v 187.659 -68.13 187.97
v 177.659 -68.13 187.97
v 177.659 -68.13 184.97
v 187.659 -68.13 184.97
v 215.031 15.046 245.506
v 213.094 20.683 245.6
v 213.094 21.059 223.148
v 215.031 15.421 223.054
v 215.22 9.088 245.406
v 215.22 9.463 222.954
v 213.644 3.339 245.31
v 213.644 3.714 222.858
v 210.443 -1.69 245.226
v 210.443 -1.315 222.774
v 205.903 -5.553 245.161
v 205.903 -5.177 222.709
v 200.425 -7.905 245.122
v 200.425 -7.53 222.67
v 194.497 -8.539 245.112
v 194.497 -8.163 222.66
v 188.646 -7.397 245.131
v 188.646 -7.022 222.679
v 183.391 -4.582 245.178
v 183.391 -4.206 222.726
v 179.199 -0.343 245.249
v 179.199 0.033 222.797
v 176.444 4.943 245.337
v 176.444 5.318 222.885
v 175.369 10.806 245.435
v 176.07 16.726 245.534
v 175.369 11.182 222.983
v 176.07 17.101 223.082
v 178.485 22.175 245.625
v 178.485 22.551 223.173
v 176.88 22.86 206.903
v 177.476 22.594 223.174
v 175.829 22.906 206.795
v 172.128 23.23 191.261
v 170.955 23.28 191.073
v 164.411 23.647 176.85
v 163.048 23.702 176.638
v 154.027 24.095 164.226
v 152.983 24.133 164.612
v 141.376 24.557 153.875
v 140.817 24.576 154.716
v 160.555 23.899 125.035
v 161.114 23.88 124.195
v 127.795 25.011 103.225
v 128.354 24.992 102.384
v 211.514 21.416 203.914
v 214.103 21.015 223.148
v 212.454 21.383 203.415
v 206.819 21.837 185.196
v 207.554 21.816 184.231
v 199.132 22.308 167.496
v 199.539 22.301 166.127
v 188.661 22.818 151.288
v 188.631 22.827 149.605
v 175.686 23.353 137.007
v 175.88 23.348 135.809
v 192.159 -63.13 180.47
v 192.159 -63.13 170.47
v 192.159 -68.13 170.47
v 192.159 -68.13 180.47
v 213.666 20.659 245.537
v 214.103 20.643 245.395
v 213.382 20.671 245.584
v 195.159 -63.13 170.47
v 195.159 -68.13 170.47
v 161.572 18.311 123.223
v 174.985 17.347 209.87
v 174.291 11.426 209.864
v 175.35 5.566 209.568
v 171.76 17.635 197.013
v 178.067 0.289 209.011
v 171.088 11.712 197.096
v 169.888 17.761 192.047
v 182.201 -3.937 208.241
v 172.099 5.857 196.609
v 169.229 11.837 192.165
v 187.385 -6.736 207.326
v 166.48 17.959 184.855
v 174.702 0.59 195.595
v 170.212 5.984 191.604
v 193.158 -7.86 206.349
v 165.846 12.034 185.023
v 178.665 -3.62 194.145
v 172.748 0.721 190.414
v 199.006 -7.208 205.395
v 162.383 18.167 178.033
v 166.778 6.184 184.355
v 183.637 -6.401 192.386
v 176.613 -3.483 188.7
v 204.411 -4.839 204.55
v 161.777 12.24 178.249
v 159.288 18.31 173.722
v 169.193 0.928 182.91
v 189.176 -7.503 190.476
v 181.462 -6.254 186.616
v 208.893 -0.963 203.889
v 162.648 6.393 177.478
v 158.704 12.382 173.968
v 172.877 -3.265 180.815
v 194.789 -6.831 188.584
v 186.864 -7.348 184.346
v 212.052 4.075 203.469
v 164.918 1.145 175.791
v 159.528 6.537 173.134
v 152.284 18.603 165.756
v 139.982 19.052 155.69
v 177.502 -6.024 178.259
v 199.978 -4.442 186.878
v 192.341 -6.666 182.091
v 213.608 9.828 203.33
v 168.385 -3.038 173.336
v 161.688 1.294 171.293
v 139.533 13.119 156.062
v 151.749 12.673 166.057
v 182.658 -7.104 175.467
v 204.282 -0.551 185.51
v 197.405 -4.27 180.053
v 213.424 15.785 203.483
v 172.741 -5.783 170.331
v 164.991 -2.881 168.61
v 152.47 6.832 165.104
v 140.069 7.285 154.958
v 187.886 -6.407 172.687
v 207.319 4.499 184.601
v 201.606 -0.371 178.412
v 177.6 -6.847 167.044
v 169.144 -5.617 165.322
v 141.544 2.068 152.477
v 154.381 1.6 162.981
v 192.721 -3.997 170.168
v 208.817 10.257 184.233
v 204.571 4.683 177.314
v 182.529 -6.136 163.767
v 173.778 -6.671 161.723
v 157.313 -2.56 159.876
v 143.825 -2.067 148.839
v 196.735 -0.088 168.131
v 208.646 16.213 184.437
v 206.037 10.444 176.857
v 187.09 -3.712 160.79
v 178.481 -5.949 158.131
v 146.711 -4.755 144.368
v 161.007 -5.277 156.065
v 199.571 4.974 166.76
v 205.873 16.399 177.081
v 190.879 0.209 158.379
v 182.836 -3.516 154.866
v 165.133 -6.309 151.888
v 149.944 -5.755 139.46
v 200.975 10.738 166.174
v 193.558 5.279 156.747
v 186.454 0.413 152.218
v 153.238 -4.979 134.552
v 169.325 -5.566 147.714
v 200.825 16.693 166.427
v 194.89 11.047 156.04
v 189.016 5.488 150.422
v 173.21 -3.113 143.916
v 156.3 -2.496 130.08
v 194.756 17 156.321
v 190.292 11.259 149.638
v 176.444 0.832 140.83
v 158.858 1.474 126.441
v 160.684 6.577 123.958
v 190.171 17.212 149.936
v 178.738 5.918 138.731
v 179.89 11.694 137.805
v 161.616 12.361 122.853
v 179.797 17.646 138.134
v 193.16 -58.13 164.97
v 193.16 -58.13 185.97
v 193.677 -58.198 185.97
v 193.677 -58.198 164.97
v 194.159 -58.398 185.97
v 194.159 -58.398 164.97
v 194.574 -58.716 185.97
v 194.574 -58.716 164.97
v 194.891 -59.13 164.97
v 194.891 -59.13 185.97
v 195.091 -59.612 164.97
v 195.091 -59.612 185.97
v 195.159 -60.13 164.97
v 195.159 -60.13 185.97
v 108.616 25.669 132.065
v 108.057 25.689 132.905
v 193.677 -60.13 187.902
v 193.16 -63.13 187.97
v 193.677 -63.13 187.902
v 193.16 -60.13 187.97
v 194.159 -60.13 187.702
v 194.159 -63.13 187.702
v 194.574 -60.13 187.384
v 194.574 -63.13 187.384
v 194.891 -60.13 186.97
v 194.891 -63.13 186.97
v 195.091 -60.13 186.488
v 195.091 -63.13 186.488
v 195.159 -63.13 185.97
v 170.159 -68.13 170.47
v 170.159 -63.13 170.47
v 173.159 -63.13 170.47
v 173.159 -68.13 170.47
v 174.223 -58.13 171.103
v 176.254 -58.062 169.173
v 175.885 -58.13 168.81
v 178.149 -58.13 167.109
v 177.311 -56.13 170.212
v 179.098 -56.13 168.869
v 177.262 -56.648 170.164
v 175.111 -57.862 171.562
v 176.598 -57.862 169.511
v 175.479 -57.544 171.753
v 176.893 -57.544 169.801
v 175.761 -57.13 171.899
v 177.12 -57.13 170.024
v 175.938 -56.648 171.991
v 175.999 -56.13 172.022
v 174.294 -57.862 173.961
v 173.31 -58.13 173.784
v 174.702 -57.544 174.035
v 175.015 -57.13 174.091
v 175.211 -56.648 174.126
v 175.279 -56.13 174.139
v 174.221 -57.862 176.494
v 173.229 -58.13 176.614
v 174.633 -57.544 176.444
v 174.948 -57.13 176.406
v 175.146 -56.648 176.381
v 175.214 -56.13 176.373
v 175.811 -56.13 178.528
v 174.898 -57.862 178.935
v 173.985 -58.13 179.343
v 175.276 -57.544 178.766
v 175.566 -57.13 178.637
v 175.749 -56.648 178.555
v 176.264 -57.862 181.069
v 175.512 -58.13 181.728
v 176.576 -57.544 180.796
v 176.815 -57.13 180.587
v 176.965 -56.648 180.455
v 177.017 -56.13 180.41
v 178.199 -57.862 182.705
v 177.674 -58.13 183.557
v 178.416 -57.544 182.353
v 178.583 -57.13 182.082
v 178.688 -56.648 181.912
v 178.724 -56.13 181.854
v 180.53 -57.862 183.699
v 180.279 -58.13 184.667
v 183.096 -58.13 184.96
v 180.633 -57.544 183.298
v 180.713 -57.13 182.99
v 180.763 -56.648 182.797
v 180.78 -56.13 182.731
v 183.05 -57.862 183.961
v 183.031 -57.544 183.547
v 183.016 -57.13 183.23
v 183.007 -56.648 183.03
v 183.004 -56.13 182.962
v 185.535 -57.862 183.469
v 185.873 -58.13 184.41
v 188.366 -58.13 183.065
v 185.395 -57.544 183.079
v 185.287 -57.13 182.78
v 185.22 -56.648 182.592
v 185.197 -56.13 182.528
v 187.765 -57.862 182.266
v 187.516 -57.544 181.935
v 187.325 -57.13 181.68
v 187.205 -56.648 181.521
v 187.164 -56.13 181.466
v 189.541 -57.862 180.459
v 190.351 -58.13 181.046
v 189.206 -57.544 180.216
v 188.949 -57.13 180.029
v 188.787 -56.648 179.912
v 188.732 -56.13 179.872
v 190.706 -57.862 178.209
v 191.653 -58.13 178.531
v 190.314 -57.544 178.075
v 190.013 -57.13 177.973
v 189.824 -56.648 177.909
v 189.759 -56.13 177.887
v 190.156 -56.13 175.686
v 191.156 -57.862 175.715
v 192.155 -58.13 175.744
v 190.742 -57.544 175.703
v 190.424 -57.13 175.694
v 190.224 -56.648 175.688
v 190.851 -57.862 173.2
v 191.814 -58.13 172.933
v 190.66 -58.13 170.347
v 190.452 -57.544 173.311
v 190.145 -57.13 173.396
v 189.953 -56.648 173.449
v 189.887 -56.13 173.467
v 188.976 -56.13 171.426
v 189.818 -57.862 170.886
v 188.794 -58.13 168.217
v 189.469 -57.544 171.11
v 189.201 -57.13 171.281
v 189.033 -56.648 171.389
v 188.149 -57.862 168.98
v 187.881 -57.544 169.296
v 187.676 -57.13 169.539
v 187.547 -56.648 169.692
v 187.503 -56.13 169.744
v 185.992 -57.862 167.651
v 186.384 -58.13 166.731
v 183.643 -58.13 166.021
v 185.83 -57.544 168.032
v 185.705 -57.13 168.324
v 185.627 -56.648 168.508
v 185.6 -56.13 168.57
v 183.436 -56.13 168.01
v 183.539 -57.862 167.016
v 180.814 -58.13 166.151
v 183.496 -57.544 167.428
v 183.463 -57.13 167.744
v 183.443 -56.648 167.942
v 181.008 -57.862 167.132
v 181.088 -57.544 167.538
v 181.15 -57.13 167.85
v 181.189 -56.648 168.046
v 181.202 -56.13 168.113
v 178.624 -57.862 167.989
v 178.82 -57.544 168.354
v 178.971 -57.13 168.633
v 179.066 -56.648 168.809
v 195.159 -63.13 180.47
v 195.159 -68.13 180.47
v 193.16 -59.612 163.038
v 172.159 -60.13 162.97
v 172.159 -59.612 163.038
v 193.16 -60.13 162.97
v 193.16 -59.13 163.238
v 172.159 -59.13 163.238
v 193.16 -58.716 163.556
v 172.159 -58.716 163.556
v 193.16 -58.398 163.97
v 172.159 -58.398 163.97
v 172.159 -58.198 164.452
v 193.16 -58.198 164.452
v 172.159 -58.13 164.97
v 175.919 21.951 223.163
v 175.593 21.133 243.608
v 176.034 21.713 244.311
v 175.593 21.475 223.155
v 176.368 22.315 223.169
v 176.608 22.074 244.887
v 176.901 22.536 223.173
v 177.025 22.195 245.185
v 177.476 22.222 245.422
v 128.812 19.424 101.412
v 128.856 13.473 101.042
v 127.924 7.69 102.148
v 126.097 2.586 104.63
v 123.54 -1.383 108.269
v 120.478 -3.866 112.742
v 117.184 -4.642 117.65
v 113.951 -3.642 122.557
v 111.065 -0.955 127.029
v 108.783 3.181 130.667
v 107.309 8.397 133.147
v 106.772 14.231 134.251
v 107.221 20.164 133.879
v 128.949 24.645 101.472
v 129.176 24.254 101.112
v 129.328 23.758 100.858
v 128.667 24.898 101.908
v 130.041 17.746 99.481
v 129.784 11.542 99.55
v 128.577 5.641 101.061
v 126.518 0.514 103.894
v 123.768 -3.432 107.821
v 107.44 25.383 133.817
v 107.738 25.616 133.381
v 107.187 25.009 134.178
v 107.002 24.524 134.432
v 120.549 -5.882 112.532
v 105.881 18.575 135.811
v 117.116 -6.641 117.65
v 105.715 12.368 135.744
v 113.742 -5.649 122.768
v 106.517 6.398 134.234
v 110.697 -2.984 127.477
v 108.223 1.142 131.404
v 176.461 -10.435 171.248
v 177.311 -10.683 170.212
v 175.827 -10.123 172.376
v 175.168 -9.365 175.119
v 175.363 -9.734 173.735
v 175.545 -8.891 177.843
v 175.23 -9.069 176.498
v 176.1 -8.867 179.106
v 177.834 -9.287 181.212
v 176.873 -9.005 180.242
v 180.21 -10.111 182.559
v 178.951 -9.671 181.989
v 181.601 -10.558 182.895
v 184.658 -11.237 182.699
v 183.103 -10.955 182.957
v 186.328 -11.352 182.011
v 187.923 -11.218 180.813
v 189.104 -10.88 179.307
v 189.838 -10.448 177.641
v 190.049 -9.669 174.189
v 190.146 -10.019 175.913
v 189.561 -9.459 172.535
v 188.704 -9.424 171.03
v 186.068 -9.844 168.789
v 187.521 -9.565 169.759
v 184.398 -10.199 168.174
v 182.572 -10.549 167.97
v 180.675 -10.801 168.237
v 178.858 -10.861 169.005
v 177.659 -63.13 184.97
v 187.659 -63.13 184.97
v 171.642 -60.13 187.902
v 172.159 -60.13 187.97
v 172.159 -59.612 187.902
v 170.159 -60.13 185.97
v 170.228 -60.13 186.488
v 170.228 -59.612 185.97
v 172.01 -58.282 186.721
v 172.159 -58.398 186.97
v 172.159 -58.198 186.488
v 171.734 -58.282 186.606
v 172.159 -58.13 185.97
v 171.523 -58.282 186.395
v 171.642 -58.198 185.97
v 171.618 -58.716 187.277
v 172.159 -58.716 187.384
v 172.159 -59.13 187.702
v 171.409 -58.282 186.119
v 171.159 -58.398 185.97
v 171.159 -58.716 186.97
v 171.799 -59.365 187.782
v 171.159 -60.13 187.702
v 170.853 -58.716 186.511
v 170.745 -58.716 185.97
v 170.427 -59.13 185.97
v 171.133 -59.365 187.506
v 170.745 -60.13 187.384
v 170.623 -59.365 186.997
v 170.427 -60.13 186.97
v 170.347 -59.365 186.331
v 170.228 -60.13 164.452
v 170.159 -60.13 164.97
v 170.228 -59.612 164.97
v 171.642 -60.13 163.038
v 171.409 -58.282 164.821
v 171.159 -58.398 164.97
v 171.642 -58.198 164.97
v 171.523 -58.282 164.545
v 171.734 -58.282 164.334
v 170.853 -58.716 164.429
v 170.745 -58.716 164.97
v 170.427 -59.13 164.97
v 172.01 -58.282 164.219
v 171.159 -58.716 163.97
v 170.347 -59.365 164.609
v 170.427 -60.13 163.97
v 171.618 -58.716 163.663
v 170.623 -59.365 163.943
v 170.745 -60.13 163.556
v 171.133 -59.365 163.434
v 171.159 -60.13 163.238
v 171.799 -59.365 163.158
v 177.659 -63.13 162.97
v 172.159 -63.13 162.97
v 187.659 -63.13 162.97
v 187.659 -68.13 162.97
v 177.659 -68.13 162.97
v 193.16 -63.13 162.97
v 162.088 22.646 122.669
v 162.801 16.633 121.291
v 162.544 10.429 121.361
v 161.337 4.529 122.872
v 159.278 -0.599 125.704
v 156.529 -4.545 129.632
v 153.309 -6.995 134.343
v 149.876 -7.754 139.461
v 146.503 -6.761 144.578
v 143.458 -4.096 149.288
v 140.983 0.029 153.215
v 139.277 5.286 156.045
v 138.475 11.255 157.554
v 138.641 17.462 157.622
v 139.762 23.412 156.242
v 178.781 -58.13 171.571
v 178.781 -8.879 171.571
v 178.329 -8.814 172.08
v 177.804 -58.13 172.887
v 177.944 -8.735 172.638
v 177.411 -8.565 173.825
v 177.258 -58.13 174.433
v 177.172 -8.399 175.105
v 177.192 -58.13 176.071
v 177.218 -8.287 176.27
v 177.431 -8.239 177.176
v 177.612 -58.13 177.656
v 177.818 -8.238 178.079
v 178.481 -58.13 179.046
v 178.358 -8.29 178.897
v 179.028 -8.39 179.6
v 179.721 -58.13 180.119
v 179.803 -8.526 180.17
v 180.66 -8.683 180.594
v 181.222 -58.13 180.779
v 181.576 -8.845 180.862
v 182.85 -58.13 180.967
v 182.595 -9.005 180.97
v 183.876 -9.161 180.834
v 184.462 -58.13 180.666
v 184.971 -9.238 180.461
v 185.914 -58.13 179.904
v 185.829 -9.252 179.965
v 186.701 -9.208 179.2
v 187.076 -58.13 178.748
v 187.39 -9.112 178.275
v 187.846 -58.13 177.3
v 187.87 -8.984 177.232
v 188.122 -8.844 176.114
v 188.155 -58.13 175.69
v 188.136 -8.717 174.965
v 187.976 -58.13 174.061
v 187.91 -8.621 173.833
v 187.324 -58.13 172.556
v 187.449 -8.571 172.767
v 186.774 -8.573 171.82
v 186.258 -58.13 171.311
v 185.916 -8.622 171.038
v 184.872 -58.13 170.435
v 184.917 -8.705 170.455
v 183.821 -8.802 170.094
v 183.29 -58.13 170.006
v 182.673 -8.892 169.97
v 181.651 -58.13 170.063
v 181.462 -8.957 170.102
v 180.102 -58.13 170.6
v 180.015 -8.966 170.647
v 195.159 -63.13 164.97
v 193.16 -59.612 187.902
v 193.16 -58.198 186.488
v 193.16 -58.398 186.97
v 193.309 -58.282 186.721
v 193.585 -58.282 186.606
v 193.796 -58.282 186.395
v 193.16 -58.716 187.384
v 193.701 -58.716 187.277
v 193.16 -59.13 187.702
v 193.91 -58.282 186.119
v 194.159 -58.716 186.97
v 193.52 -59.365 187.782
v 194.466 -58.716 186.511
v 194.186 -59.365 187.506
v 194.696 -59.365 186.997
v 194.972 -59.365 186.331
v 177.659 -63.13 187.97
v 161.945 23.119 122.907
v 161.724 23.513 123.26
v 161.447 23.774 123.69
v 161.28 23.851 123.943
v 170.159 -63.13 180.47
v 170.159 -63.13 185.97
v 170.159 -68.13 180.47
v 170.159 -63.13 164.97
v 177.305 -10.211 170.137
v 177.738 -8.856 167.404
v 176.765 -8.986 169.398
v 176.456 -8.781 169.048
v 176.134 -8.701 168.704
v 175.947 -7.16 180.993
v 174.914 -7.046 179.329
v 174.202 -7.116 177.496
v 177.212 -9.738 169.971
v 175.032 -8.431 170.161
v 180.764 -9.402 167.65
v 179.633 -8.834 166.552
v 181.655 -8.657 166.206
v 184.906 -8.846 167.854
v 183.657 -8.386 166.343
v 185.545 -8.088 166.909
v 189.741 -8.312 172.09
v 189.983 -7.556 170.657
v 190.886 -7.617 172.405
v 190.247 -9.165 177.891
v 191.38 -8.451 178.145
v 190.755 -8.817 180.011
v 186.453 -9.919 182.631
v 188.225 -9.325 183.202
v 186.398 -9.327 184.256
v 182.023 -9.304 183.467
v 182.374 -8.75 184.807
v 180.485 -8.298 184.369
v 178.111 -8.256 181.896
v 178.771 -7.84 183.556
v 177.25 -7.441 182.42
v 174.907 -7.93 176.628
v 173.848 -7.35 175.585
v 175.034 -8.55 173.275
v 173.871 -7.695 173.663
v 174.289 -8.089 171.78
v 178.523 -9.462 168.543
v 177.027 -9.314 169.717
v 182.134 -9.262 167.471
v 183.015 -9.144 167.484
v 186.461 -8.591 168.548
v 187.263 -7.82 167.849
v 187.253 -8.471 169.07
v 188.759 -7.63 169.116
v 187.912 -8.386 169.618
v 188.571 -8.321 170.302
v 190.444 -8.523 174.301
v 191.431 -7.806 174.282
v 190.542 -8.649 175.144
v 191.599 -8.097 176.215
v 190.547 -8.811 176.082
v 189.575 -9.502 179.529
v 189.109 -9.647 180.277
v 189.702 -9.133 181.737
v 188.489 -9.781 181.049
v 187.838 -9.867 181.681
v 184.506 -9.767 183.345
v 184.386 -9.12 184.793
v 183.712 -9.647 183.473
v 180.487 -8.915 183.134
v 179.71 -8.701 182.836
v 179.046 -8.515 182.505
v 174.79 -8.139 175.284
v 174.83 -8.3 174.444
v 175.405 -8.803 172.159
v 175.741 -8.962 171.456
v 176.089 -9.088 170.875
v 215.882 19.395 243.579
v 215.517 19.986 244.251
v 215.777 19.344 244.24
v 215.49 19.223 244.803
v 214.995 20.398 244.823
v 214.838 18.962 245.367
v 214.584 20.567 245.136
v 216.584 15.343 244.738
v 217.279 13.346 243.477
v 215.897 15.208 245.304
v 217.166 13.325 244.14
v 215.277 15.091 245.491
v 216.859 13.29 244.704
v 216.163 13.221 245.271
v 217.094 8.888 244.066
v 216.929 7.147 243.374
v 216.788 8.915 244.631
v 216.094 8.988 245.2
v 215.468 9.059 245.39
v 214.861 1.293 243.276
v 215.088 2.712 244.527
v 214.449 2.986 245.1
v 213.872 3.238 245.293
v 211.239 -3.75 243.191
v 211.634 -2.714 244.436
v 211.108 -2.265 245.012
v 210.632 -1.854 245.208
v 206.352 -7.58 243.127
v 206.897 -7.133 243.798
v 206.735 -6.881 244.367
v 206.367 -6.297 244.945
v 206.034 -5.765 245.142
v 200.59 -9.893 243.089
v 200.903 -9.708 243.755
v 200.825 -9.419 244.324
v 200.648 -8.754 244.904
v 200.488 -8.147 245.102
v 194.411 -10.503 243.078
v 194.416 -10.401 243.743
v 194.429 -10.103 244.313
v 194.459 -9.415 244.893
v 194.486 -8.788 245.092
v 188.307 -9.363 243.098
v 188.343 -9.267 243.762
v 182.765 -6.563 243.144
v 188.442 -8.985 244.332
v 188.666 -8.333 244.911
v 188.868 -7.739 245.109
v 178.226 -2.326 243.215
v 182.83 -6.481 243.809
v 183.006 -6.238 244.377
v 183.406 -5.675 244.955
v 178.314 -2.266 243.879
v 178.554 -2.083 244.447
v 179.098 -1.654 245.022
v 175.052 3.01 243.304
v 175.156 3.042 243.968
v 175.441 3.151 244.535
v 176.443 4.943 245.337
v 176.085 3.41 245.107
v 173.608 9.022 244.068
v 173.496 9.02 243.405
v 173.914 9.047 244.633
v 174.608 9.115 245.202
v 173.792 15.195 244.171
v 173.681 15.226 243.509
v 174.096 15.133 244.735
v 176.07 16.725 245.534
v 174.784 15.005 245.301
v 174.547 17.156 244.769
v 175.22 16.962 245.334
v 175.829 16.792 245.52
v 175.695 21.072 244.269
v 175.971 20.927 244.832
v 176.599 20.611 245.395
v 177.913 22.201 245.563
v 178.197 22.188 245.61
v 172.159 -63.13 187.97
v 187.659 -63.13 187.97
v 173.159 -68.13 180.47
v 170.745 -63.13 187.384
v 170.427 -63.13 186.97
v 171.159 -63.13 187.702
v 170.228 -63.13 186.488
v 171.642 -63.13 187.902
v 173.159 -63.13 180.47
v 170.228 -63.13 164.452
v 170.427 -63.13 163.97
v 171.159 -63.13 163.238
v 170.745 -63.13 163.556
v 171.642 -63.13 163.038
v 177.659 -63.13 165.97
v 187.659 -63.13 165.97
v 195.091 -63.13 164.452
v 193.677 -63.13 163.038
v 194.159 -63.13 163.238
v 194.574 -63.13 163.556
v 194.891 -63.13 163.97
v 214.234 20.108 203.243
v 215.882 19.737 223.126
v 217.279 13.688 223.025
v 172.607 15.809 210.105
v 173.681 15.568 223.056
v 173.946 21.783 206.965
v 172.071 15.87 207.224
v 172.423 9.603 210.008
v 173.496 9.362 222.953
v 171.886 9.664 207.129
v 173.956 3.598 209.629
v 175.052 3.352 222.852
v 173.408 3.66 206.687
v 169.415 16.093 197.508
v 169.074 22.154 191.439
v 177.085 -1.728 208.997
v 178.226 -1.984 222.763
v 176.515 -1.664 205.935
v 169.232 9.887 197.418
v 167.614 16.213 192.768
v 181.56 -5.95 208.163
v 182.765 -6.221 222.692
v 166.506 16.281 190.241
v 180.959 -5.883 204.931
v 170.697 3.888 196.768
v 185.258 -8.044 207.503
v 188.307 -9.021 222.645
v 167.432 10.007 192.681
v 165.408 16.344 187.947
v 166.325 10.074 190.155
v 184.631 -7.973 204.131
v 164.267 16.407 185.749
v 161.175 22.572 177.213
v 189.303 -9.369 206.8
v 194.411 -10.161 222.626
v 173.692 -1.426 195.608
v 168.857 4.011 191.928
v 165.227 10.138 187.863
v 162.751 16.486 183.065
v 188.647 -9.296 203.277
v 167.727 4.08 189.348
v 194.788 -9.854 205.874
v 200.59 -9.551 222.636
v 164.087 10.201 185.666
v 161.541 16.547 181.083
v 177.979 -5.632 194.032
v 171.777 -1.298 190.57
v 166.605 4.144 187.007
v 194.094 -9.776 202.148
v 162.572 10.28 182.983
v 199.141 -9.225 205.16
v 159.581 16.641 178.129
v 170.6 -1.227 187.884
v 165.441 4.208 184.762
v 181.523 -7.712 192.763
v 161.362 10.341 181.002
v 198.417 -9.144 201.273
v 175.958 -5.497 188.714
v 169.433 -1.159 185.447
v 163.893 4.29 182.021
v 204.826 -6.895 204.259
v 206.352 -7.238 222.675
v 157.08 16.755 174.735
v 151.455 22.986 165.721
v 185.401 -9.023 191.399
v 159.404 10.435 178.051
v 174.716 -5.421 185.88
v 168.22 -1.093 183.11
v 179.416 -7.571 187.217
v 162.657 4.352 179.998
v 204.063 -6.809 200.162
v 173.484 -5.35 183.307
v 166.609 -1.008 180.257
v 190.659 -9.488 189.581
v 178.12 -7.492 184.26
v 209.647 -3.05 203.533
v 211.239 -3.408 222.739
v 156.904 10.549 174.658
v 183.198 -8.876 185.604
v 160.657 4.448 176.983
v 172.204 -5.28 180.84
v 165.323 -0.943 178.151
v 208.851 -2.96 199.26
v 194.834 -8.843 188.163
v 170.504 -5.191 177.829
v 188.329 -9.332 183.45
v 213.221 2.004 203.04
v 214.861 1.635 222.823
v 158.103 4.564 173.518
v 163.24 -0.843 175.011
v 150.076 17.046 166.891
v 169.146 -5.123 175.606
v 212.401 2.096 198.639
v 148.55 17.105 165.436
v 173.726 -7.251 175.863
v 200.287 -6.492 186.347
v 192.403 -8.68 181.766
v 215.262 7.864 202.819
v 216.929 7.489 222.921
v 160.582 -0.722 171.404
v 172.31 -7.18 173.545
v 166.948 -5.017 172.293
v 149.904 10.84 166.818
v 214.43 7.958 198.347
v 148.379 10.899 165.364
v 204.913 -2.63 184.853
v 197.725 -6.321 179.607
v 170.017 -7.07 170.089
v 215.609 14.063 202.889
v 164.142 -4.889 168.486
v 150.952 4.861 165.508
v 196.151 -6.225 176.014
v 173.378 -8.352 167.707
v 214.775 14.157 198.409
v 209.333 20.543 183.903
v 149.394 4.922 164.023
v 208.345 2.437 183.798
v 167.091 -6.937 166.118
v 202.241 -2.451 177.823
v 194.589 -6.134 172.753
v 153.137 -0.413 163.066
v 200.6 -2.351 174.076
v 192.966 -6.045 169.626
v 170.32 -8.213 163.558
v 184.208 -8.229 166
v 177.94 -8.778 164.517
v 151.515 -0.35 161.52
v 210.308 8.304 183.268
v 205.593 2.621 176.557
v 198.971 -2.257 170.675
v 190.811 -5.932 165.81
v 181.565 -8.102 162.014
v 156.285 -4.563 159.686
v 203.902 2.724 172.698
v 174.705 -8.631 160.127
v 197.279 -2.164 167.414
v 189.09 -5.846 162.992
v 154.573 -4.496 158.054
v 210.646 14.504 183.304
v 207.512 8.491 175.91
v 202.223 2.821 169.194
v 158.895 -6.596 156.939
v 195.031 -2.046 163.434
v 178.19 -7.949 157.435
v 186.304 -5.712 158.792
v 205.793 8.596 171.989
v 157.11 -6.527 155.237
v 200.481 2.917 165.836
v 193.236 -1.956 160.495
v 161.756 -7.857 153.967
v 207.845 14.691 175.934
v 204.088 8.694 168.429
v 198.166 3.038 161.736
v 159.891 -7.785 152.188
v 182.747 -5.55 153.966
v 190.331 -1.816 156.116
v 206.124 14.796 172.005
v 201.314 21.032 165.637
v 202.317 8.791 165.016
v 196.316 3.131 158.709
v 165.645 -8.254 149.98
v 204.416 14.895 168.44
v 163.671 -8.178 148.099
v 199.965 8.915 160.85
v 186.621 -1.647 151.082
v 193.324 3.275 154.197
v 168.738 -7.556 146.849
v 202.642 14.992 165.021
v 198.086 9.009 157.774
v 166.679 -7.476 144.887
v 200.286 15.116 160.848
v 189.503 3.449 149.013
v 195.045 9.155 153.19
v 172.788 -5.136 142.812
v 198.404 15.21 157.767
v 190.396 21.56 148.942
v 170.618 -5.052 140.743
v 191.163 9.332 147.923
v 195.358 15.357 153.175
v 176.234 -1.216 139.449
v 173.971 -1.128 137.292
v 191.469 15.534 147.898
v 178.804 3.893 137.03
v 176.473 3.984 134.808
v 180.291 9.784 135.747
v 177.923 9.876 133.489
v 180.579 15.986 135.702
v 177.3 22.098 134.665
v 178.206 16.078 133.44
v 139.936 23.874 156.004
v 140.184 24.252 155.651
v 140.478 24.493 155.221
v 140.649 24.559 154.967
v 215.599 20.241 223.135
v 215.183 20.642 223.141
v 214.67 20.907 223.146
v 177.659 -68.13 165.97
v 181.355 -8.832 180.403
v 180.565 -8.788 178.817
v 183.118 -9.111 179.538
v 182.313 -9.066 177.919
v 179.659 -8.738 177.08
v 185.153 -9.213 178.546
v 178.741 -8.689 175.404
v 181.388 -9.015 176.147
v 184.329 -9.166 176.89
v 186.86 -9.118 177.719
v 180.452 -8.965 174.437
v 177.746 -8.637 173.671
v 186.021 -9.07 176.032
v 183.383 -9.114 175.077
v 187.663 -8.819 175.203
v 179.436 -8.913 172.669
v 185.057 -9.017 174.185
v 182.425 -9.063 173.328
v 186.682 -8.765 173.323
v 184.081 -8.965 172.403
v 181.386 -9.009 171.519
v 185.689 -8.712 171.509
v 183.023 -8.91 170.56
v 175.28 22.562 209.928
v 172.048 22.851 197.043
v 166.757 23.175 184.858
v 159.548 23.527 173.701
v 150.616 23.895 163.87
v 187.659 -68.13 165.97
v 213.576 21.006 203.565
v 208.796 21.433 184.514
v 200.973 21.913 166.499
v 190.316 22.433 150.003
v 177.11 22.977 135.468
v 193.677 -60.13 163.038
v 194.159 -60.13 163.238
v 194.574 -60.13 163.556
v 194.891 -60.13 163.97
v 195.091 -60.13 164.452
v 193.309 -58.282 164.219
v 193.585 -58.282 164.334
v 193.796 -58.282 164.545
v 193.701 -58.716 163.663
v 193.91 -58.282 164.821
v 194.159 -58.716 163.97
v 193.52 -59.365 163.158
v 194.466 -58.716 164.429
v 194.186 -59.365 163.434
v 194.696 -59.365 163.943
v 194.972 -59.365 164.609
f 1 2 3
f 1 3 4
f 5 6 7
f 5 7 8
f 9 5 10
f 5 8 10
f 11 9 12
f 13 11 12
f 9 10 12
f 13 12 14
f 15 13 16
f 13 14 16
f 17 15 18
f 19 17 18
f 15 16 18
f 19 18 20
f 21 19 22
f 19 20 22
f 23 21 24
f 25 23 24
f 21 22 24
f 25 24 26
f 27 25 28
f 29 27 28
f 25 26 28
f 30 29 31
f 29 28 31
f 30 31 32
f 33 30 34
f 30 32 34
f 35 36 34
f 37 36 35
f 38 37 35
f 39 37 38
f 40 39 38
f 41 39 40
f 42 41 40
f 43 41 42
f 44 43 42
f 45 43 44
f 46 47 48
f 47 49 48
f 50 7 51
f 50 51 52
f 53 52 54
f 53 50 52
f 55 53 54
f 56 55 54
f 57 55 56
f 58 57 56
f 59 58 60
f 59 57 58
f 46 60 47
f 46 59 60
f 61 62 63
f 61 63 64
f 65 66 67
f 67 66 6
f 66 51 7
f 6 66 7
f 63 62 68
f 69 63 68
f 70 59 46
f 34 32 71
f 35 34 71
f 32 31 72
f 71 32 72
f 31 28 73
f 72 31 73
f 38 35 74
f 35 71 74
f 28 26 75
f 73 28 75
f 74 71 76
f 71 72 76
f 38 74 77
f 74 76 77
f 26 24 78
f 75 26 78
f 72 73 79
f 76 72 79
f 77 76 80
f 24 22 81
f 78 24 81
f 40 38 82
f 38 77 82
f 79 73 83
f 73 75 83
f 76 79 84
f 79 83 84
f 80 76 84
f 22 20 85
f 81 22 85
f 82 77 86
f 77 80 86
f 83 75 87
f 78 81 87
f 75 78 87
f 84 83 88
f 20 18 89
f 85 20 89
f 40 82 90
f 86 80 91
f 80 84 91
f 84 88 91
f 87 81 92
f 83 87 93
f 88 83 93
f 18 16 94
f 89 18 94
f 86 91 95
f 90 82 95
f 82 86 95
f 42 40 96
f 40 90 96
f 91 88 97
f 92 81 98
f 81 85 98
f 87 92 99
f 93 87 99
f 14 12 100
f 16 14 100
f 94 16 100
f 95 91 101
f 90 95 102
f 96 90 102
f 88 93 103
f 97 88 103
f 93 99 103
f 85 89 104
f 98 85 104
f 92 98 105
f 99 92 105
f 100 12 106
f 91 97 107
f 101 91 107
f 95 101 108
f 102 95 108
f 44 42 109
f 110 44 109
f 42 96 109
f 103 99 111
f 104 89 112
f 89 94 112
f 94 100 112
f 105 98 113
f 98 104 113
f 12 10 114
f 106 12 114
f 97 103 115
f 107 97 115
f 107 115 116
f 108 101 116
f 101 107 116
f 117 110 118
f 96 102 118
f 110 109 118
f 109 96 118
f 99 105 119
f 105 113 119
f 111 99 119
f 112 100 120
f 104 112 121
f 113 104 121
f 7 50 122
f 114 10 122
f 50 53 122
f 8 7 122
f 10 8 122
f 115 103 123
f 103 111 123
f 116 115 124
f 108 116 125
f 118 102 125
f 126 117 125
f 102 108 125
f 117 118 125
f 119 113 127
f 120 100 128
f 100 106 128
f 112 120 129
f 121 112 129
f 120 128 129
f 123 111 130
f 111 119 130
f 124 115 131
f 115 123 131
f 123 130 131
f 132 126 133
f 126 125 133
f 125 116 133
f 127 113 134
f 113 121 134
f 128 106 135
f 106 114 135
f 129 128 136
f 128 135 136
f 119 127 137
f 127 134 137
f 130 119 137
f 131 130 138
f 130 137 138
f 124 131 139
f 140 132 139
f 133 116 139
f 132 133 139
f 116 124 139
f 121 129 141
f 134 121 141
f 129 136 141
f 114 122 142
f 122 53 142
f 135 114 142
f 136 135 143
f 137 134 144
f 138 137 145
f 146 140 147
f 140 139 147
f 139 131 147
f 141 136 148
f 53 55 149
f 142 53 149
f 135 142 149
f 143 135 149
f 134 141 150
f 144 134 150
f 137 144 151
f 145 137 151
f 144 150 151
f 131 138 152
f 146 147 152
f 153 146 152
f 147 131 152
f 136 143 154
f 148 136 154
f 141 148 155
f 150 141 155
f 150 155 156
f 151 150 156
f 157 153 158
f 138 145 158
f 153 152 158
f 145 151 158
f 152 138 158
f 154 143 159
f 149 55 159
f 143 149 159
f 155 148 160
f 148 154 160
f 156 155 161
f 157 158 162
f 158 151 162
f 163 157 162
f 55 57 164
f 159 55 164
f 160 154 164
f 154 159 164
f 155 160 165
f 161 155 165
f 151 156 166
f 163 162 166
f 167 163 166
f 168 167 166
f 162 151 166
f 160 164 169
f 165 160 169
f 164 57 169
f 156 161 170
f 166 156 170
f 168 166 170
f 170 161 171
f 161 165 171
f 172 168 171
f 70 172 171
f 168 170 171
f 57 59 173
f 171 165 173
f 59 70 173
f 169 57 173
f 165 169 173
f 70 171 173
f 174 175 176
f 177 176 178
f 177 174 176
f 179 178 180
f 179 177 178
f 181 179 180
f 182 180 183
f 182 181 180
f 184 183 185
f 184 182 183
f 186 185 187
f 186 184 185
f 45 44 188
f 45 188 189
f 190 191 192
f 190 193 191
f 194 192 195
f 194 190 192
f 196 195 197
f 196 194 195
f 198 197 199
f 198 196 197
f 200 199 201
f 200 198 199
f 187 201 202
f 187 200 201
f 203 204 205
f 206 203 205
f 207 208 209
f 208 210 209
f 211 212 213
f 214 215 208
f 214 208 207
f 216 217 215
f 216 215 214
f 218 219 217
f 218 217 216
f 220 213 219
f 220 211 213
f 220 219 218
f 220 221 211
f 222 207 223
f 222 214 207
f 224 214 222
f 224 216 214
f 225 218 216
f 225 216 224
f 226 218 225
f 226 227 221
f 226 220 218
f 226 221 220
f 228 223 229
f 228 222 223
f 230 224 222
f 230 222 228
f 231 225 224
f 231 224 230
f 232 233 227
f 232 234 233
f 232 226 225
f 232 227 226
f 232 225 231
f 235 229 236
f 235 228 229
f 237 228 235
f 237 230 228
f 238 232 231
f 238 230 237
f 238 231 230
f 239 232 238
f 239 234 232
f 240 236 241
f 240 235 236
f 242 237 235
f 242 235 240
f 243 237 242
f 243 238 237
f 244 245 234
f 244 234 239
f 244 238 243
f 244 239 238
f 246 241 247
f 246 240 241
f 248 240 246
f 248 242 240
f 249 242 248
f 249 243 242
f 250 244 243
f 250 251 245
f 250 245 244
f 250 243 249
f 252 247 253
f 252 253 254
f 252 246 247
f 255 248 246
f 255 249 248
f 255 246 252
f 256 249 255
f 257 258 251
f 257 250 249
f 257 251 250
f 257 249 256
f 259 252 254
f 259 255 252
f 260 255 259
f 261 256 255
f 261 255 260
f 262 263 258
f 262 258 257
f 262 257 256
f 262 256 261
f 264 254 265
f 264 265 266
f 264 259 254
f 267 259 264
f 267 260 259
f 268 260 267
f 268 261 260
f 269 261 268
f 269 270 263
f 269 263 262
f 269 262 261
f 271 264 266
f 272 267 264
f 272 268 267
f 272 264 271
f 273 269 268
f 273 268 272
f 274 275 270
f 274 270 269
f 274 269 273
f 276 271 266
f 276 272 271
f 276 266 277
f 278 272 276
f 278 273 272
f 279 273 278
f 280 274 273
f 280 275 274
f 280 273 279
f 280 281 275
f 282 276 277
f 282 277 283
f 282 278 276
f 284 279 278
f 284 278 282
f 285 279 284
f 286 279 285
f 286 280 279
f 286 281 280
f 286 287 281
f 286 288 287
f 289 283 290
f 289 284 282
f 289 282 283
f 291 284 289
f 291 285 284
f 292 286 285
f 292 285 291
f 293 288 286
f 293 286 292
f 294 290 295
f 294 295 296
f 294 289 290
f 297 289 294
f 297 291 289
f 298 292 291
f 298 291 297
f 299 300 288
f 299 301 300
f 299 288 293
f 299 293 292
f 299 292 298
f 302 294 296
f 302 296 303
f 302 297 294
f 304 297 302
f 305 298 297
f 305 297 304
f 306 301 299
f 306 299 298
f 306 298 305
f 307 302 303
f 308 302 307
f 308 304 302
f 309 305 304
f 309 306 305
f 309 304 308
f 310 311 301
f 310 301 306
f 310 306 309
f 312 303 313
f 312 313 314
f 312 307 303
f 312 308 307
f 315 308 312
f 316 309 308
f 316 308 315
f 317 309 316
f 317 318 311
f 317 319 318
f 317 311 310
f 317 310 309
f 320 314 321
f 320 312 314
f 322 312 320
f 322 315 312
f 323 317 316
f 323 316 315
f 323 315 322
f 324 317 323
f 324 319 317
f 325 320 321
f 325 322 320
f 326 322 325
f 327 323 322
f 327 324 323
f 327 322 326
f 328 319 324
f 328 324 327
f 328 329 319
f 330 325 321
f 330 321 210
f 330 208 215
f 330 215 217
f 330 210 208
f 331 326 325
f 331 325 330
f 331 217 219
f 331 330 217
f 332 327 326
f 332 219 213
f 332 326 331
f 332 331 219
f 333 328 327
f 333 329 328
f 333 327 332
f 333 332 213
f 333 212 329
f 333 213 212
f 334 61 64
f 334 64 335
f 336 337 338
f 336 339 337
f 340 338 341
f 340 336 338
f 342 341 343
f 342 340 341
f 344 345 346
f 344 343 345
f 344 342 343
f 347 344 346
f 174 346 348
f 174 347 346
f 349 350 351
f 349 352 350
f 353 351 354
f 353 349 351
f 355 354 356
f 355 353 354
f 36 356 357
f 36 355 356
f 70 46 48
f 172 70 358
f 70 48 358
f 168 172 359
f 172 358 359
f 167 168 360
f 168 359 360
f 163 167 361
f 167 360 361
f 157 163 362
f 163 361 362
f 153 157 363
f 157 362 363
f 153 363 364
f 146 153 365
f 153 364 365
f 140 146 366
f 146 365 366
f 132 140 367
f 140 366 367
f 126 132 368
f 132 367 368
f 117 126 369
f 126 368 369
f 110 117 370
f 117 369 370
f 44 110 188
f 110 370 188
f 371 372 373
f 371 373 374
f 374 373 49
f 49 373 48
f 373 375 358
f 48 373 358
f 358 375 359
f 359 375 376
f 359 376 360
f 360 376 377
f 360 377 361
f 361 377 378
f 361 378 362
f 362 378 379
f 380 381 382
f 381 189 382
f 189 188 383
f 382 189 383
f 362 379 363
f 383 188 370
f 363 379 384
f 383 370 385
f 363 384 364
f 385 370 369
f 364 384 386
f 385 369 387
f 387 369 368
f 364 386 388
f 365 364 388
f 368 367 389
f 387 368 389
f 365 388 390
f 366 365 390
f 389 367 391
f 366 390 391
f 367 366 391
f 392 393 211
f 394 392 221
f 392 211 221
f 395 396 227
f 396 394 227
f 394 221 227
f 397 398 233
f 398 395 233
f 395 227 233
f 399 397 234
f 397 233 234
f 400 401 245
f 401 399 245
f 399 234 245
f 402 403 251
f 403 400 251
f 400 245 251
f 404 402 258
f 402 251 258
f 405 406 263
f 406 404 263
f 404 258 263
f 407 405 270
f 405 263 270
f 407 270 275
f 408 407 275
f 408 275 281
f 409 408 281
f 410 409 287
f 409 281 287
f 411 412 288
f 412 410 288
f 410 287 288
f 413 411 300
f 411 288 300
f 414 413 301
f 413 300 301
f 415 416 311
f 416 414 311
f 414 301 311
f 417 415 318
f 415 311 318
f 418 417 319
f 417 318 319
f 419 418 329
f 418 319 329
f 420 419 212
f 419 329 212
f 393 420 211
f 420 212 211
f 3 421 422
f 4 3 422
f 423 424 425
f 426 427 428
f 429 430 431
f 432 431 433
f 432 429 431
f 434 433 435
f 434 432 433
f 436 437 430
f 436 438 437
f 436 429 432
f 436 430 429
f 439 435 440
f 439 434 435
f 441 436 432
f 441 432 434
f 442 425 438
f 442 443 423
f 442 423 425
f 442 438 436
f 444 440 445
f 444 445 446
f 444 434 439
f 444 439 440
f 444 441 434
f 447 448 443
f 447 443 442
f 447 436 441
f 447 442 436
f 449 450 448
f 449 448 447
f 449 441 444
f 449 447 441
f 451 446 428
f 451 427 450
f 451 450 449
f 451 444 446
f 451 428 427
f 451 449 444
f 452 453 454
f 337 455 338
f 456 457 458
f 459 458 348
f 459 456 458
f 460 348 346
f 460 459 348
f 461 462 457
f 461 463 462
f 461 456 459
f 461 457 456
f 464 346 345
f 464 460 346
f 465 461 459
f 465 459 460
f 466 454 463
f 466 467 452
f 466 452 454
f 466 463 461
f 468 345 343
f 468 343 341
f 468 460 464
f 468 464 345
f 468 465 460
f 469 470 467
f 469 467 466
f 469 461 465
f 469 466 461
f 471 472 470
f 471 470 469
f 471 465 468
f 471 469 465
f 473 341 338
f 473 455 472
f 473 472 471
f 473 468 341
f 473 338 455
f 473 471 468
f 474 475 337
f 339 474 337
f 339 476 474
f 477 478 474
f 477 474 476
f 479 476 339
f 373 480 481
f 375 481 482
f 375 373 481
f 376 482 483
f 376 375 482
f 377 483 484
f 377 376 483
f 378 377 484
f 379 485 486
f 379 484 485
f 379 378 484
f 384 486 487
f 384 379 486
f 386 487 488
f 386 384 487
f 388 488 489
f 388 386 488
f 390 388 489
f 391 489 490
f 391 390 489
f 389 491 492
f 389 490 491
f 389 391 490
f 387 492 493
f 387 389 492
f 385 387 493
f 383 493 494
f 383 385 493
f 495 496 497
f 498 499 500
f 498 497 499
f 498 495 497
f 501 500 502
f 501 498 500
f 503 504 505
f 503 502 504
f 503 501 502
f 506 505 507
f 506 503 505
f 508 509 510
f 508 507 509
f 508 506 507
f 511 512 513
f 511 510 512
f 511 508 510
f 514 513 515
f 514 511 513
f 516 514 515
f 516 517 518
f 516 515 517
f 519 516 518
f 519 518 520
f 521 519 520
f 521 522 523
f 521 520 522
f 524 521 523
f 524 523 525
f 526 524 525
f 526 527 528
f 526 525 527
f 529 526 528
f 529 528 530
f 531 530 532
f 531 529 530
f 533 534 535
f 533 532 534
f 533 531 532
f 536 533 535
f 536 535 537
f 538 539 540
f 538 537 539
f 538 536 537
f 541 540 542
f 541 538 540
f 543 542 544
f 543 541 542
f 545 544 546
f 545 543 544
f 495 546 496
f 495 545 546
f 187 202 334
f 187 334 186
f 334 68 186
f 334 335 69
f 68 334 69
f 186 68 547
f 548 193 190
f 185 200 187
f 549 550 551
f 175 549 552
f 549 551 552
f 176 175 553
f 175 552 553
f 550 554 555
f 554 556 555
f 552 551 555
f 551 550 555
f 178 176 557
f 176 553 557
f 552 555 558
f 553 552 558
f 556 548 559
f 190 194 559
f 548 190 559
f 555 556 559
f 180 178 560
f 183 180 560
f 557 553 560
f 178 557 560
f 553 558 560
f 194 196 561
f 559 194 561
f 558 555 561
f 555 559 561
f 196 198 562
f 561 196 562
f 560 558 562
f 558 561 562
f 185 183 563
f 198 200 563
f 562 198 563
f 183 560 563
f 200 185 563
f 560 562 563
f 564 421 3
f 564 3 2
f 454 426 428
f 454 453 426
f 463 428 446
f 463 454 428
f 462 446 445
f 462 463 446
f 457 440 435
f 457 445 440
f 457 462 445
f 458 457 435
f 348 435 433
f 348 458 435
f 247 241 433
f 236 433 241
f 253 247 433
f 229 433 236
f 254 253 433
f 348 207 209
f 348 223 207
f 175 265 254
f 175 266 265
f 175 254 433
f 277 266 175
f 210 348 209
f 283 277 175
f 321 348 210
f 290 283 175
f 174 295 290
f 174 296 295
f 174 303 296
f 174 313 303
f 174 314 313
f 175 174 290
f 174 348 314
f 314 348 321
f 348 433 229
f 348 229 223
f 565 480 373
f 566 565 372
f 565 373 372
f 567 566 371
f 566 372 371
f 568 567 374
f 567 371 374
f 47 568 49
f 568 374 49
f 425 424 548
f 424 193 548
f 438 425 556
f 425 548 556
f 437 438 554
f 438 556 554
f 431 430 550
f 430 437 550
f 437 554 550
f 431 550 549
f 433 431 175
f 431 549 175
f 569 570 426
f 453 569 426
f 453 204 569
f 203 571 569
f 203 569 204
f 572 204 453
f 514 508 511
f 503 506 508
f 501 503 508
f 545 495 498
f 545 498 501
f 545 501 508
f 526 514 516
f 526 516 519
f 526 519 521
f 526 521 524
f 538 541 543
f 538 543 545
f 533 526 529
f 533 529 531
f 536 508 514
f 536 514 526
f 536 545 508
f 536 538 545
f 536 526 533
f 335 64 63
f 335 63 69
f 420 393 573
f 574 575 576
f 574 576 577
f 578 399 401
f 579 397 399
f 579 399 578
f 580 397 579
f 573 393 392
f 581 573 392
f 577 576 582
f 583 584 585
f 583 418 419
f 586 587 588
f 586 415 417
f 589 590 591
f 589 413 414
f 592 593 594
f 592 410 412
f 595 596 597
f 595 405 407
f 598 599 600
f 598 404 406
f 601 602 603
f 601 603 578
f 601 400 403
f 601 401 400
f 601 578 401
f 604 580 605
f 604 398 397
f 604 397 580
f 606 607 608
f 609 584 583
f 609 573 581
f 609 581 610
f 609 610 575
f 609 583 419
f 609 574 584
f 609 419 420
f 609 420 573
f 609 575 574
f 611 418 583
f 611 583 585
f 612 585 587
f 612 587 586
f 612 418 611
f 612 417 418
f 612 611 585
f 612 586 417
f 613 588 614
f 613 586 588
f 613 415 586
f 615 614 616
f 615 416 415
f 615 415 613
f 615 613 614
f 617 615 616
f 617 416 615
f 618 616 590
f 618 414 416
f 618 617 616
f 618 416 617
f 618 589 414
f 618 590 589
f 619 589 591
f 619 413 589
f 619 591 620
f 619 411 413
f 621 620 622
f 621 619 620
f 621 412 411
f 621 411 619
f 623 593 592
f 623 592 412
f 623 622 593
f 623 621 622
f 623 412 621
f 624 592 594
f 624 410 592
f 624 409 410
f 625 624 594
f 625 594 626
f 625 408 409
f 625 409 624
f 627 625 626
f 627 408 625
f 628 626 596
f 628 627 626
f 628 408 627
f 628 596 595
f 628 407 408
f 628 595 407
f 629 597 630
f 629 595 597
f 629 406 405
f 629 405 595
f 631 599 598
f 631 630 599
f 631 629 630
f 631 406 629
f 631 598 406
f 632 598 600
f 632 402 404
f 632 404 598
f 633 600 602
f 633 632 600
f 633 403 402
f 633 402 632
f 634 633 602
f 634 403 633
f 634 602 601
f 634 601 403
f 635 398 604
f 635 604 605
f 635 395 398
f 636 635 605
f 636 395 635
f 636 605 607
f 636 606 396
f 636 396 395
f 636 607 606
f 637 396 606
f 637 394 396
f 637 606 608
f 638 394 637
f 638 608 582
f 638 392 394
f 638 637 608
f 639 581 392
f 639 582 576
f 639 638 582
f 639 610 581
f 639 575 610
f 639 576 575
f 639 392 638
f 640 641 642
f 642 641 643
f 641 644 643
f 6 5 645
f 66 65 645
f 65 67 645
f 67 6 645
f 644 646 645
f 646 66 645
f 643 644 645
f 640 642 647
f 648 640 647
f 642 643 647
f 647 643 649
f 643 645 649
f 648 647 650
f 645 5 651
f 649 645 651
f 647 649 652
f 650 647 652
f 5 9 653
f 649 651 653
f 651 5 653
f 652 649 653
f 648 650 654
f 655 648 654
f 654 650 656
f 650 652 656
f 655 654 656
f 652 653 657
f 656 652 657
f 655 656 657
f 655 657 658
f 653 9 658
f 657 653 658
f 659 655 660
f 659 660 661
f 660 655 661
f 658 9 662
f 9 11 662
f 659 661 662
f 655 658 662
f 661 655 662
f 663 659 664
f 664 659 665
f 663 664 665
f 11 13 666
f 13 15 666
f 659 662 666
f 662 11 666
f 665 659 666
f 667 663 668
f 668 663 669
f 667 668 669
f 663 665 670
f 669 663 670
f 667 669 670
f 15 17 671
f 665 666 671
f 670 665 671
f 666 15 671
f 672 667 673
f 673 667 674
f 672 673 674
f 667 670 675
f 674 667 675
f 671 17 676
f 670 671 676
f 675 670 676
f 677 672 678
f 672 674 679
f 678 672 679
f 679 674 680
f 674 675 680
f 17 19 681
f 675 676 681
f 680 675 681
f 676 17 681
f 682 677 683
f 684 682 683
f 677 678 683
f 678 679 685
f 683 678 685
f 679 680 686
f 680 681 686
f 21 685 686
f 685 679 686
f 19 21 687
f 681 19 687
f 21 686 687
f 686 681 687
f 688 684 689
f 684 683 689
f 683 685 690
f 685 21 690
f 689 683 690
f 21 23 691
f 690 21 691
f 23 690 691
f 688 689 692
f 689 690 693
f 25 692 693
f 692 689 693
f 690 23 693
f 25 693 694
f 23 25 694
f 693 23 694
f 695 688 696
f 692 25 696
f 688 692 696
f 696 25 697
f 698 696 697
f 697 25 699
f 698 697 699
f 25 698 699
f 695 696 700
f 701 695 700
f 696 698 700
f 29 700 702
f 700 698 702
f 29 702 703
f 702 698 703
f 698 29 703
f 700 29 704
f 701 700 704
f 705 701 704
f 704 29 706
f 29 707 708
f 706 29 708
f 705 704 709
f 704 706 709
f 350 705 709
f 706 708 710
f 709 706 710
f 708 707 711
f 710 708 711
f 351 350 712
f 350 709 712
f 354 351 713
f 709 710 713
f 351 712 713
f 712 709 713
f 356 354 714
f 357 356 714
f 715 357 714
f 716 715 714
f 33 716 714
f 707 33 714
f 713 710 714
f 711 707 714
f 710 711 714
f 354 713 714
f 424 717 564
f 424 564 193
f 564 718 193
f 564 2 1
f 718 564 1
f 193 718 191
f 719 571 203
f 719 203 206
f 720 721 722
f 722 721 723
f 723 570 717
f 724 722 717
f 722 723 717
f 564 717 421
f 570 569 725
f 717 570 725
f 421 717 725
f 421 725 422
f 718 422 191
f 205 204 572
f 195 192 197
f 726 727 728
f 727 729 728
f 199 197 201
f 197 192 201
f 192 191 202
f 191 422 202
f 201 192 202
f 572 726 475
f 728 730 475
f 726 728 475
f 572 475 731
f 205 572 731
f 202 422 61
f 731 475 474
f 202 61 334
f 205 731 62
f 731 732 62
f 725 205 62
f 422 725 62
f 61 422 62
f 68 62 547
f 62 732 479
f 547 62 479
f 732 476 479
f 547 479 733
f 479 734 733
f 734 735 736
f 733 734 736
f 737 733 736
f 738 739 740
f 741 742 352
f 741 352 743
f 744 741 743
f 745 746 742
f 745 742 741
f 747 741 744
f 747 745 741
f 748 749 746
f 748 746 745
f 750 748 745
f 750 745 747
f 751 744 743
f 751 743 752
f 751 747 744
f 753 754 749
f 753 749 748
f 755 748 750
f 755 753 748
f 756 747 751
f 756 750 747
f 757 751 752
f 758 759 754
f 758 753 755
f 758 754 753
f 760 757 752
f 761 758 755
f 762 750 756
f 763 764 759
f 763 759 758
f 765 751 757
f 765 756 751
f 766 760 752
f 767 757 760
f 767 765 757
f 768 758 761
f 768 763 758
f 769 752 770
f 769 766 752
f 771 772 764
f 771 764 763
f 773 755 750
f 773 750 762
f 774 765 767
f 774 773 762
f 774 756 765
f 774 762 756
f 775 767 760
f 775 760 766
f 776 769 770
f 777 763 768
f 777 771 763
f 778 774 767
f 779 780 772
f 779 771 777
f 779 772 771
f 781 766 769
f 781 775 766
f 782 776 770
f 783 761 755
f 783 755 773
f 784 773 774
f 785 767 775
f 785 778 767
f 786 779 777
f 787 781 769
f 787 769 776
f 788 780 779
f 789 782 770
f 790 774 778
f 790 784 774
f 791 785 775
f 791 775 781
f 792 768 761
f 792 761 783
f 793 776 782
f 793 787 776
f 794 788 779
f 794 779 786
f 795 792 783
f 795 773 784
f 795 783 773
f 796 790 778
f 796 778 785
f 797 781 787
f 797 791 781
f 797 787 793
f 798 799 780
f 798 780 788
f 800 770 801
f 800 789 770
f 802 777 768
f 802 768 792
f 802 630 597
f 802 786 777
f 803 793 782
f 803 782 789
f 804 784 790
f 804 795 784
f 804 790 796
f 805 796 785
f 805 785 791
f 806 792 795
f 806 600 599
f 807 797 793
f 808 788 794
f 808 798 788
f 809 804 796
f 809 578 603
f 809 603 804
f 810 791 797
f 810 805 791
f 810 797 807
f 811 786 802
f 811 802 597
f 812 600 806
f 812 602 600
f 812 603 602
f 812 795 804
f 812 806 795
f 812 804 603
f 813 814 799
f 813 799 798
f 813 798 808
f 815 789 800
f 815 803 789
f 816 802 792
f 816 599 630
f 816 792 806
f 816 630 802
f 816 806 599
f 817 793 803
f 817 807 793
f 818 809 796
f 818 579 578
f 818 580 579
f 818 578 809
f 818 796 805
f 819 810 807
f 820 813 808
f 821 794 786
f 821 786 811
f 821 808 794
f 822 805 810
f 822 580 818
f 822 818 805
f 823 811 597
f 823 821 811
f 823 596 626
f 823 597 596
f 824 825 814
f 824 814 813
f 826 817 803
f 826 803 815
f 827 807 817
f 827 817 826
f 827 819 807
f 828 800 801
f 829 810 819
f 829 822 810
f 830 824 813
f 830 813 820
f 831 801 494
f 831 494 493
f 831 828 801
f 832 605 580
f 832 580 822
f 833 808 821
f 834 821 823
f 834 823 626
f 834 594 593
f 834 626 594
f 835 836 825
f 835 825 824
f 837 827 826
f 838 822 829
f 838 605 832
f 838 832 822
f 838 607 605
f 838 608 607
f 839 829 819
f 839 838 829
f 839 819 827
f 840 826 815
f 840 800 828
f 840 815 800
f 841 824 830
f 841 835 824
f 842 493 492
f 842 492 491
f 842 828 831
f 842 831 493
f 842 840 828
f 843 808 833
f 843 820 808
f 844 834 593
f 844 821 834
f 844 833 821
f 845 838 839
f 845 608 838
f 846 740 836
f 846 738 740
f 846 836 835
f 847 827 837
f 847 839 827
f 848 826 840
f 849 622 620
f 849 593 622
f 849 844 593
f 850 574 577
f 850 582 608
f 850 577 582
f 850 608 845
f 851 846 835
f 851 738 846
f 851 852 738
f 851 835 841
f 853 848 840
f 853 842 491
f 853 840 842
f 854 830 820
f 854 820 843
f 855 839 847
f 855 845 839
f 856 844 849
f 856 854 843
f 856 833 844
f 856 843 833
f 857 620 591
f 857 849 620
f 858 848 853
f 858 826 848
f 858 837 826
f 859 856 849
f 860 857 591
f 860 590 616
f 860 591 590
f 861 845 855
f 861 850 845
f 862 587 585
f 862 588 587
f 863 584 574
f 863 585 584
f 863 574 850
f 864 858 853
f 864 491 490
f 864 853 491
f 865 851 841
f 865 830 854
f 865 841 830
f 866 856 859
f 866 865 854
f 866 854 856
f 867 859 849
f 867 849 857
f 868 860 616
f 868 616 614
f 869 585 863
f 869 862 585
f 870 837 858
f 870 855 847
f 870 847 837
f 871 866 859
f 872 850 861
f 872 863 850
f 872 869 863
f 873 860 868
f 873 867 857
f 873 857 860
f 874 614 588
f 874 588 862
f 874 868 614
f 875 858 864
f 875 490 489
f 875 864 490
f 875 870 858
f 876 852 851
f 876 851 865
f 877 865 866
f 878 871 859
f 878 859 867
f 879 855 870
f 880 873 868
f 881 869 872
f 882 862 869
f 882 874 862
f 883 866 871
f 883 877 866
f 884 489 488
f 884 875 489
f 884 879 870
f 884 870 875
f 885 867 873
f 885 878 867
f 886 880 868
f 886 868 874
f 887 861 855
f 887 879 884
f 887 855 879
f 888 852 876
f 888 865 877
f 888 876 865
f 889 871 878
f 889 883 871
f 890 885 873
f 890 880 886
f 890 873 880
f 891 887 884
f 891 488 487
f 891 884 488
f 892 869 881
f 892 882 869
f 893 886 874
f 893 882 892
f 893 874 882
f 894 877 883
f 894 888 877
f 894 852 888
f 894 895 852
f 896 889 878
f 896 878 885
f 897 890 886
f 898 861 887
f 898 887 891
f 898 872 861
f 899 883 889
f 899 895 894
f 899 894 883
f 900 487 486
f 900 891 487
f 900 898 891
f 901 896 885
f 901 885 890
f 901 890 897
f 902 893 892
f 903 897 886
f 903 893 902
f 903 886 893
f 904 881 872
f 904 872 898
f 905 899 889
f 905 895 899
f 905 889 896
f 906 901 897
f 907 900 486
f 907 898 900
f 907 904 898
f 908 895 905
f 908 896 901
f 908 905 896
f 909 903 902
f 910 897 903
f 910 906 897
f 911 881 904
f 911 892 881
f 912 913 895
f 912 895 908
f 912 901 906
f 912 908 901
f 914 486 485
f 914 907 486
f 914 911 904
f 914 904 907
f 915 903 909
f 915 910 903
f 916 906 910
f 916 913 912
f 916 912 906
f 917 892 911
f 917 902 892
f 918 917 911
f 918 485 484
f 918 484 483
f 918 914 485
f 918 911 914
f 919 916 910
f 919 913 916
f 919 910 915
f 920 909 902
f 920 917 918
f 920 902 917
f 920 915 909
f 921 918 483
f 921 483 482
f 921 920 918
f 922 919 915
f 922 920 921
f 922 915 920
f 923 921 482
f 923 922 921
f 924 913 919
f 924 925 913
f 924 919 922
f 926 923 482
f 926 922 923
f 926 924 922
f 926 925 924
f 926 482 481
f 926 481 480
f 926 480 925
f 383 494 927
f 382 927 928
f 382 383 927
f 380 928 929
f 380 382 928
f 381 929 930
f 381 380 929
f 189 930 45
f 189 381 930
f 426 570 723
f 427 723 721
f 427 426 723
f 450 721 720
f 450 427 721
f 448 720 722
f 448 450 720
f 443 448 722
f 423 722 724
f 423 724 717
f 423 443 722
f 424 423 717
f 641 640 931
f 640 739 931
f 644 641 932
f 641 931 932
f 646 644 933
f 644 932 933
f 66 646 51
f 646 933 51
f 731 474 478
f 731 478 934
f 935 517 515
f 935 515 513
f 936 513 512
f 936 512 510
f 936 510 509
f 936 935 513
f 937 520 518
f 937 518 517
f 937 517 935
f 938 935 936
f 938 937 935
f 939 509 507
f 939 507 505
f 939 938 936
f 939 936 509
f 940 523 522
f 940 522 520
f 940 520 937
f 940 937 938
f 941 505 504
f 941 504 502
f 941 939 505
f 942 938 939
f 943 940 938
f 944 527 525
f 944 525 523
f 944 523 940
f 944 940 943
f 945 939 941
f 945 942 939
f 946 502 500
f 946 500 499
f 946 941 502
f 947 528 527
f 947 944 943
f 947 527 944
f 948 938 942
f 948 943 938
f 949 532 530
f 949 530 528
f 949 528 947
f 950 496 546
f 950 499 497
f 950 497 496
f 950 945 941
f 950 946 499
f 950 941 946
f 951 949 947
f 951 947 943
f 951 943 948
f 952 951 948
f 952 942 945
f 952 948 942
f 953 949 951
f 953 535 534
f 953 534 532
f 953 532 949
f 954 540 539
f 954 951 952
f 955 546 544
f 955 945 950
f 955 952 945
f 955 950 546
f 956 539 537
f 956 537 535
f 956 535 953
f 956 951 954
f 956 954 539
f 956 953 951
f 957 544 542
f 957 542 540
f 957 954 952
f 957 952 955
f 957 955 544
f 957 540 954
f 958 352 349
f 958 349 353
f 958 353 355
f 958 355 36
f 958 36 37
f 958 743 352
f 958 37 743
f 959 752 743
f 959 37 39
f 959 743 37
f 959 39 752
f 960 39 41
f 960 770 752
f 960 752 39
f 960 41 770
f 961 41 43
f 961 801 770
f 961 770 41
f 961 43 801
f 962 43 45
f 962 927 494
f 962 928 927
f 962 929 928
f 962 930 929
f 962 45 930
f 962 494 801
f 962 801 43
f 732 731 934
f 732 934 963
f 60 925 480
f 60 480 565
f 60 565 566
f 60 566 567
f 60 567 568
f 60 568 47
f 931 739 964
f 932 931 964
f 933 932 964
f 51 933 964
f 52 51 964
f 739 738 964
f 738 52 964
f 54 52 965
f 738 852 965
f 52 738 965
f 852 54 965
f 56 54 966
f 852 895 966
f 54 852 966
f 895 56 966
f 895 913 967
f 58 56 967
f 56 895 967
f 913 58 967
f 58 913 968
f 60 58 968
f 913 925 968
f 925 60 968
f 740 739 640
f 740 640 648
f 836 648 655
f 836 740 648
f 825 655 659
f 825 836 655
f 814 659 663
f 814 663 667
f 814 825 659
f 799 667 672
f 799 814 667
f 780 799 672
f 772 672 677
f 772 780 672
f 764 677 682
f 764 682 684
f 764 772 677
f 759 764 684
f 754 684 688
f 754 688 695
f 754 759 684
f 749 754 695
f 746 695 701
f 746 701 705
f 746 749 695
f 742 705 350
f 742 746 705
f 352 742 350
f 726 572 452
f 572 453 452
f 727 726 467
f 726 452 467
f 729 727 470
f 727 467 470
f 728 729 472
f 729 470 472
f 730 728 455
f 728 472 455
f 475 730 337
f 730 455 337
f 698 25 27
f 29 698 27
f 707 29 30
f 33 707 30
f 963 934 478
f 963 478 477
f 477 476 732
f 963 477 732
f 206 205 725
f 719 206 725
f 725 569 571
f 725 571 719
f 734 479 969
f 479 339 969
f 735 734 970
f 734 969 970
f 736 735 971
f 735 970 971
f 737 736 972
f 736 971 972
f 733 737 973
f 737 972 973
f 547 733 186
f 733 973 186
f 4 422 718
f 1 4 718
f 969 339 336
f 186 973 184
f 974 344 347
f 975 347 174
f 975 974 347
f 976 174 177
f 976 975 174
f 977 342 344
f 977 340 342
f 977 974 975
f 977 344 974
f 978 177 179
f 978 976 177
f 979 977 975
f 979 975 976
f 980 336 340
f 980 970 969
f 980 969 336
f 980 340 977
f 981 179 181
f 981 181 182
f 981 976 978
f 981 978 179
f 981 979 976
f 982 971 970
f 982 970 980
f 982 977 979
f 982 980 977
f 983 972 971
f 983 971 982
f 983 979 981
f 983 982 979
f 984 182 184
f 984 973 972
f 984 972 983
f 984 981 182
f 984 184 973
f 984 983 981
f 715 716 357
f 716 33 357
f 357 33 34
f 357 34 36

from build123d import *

# Parameters (mm, degrees)
SKETCH8_W                      = 25
SKETCH8_H                      = 25
BOSS_EXTRUDE1_DEPTH            = 5
BOSS_EXTRUDE2_REACH            = 340.536
BOSS_EXTRUDE2_END_MAJOR_RADIUS = 100.405635927
BOSS_EXTRUDE2_END_MINOR_RADIUS = 22
SKETCH9_R                      = 7.5
SKETCH9_R_2                    = 5.5
SKETCH10_W                     = 3
SKETCH10_H                     = 10
SKETCH10_W_2                   = 10
SKETCH10_H_2                   = 3
BOSS_EXTRUDE3_DEPTH            = 5
FILLET1_R                      = 2


with BuildPart() as part:
    # Sweep1: sweep along a path in Sketch5
    with BuildLine(Plane(origin=(0, 0, 0), x_dir=(0.9997397545029943, -0.022809596622636426, -0.00038153401579630816), z_dir=(0.022812787341589733, 0.9995999255318432, 0.016720215621847893))) as sweep1_path:
        Line((194.547507167, -245.220027859), (194.547507167, -222.76492725))
        ThreePointArc((194.547507167, -222.76492725), (182.70523744, -175.56095927), (149.983215305, -139.53703371))
        Line((149.983215305, -139.53703371), (117.214576165, -117.710784863))
    # Sketch7 → Sweep1 (sweep)
    with BuildSketch(Plane(origin=(117.1840716, -4.64227924, 117.649599852), x_dir=(0.5536361283474212, -0.018999100028837552, -0.8325419338307064), z_dir=(0.8320623385601692, -0.028255329561967652, 0.5539620033008825))):
        with BuildLine():
            Line((-17.320508076, 30), (-19.595917942, 30))
            ThreePointArc((-19.595917942, 30), (0, -2), (19.595917942, 30))
            Line((19.595917942, 30), (17.320508076, 30))
            ThreePointArc((17.320508076, 30), (0, 0), (-17.320508076, 30))
        make_face()
    sweep(path=sweep1_path.line)



with BuildPart() as body_2:
    # Sketch8 → Boss-Extrude1 (new body)
    with BuildSketch(Plane(origin=(0, -63.13, 0), x_dir=(1, 0, 0), z_dir=(0, 1, 0))):
        with Locations((182.659431616, -175.469950055)):
            Rectangle(SKETCH8_W, SKETCH8_H)
    extrude(amount=BOSS_EXTRUDE1_DEPTH)


with BuildPart() as part_1:
    add(part.part)

    add(body_2.part)  # Boss-Extrude2 merges body 2
    # Boss-Extrude2: up to this torus (the profile starts outside it)
    boss_extrude2_end = Plane(origin=(94.9790635, 14.105648521, 223.032032588), z_dir=(-0.022812787341589733, -0.9995999255318432, -0.016720215621847893)) * Torus(BOSS_EXTRUDE2_END_MAJOR_RADIUS, BOSS_EXTRUDE2_END_MINOR_RADIUS, mode=Mode.PRIVATE)
    # Sketch9 → Boss-Extrude2 (add, up to the surface)
    with BuildSketch(Plane(origin=(0, -58.13, 0), x_dir=(1, 0, 0), z_dir=(0, 1, 0)), mode=Mode.PRIVATE) as boss_extrude2_sk1:
        with Locations(Location((182.659431616, -175.469950055, 0), (0, 0, 135.488790449))):
            Circle(SKETCH9_R)
        with Locations(Location((182.659431616, -175.469950055, 0), (0, 0, 134.847331682))):
            Circle(SKETCH9_R_2, mode=Mode.SUBTRACT)
    boss_extrude2_tool1 = extrude(boss_extrude2_sk1.sketch, amount=BOSS_EXTRUDE2_REACH, mode=Mode.PRIVATE) - boss_extrude2_end
    add(boss_extrude2_tool1.solids().sort_by_distance((187.856507, -58.13, 180.579101))[0])

    # Sketch10 → Boss-Extrude3 (add)
    with BuildSketch(Plane.XZ.offset(63.13)):
        with Locations((193.659431616, 175.469950055)):
            Rectangle(SKETCH10_W, SKETCH10_H)
        with Locations((182.659431616, 164.469950055)):
            Rectangle(SKETCH10_W_2, SKETCH10_H_2)
        with Locations((171.659431616, 175.469950055)):
            Rectangle(SKETCH10_W, SKETCH10_H)
        with Locations((182.659431616, 186.469950055)):
            Rectangle(SKETCH10_W_2, SKETCH10_H_2)
    extrude(amount=BOSS_EXTRUDE3_DEPTH)

    # Fillet1
    fillet1_edges = [part_1.edges().sort_by_distance(p)[0] for p in [
        (170.159431616, -60.63, 187.969950055),
        (170.159431616, -60.63, 162.969950055),
        (195.159431616, -60.63, 162.969950055),
        (195.159431616, -60.63, 187.969950055),
        (187.938592199, -9.225851682, 180.797281789),
        (188.007781419, -58.13, 180.727816009),
        (182.659431616, -58.13, 187.969950055),
        (170.159431616, -58.13, 175.469950055),
        (182.659431616, -58.13, 162.969950055),
        (195.159431616, -58.13, 175.469950055),
        (123.73657487, 25.156393567, 144.864412221),
        (166.619990229, 23.507355906, 184.94091022),
        (176.211693741, 22.461141905, 234.400915023),
        (215.367137143, 20.772812998, 234.372674502),
        (145.434591152, 24.411783957, 112.235565383),
        (201.136392999, 22.234211756, 166.420730851),
        (194.410707828, -10.536612604, 245.078085501),
    ]]
    fillet(fillet1_edges, radius=FILLET1_R - 0.0001)  # a hair under: the kernel refuses the full size


solid = part_1.part
